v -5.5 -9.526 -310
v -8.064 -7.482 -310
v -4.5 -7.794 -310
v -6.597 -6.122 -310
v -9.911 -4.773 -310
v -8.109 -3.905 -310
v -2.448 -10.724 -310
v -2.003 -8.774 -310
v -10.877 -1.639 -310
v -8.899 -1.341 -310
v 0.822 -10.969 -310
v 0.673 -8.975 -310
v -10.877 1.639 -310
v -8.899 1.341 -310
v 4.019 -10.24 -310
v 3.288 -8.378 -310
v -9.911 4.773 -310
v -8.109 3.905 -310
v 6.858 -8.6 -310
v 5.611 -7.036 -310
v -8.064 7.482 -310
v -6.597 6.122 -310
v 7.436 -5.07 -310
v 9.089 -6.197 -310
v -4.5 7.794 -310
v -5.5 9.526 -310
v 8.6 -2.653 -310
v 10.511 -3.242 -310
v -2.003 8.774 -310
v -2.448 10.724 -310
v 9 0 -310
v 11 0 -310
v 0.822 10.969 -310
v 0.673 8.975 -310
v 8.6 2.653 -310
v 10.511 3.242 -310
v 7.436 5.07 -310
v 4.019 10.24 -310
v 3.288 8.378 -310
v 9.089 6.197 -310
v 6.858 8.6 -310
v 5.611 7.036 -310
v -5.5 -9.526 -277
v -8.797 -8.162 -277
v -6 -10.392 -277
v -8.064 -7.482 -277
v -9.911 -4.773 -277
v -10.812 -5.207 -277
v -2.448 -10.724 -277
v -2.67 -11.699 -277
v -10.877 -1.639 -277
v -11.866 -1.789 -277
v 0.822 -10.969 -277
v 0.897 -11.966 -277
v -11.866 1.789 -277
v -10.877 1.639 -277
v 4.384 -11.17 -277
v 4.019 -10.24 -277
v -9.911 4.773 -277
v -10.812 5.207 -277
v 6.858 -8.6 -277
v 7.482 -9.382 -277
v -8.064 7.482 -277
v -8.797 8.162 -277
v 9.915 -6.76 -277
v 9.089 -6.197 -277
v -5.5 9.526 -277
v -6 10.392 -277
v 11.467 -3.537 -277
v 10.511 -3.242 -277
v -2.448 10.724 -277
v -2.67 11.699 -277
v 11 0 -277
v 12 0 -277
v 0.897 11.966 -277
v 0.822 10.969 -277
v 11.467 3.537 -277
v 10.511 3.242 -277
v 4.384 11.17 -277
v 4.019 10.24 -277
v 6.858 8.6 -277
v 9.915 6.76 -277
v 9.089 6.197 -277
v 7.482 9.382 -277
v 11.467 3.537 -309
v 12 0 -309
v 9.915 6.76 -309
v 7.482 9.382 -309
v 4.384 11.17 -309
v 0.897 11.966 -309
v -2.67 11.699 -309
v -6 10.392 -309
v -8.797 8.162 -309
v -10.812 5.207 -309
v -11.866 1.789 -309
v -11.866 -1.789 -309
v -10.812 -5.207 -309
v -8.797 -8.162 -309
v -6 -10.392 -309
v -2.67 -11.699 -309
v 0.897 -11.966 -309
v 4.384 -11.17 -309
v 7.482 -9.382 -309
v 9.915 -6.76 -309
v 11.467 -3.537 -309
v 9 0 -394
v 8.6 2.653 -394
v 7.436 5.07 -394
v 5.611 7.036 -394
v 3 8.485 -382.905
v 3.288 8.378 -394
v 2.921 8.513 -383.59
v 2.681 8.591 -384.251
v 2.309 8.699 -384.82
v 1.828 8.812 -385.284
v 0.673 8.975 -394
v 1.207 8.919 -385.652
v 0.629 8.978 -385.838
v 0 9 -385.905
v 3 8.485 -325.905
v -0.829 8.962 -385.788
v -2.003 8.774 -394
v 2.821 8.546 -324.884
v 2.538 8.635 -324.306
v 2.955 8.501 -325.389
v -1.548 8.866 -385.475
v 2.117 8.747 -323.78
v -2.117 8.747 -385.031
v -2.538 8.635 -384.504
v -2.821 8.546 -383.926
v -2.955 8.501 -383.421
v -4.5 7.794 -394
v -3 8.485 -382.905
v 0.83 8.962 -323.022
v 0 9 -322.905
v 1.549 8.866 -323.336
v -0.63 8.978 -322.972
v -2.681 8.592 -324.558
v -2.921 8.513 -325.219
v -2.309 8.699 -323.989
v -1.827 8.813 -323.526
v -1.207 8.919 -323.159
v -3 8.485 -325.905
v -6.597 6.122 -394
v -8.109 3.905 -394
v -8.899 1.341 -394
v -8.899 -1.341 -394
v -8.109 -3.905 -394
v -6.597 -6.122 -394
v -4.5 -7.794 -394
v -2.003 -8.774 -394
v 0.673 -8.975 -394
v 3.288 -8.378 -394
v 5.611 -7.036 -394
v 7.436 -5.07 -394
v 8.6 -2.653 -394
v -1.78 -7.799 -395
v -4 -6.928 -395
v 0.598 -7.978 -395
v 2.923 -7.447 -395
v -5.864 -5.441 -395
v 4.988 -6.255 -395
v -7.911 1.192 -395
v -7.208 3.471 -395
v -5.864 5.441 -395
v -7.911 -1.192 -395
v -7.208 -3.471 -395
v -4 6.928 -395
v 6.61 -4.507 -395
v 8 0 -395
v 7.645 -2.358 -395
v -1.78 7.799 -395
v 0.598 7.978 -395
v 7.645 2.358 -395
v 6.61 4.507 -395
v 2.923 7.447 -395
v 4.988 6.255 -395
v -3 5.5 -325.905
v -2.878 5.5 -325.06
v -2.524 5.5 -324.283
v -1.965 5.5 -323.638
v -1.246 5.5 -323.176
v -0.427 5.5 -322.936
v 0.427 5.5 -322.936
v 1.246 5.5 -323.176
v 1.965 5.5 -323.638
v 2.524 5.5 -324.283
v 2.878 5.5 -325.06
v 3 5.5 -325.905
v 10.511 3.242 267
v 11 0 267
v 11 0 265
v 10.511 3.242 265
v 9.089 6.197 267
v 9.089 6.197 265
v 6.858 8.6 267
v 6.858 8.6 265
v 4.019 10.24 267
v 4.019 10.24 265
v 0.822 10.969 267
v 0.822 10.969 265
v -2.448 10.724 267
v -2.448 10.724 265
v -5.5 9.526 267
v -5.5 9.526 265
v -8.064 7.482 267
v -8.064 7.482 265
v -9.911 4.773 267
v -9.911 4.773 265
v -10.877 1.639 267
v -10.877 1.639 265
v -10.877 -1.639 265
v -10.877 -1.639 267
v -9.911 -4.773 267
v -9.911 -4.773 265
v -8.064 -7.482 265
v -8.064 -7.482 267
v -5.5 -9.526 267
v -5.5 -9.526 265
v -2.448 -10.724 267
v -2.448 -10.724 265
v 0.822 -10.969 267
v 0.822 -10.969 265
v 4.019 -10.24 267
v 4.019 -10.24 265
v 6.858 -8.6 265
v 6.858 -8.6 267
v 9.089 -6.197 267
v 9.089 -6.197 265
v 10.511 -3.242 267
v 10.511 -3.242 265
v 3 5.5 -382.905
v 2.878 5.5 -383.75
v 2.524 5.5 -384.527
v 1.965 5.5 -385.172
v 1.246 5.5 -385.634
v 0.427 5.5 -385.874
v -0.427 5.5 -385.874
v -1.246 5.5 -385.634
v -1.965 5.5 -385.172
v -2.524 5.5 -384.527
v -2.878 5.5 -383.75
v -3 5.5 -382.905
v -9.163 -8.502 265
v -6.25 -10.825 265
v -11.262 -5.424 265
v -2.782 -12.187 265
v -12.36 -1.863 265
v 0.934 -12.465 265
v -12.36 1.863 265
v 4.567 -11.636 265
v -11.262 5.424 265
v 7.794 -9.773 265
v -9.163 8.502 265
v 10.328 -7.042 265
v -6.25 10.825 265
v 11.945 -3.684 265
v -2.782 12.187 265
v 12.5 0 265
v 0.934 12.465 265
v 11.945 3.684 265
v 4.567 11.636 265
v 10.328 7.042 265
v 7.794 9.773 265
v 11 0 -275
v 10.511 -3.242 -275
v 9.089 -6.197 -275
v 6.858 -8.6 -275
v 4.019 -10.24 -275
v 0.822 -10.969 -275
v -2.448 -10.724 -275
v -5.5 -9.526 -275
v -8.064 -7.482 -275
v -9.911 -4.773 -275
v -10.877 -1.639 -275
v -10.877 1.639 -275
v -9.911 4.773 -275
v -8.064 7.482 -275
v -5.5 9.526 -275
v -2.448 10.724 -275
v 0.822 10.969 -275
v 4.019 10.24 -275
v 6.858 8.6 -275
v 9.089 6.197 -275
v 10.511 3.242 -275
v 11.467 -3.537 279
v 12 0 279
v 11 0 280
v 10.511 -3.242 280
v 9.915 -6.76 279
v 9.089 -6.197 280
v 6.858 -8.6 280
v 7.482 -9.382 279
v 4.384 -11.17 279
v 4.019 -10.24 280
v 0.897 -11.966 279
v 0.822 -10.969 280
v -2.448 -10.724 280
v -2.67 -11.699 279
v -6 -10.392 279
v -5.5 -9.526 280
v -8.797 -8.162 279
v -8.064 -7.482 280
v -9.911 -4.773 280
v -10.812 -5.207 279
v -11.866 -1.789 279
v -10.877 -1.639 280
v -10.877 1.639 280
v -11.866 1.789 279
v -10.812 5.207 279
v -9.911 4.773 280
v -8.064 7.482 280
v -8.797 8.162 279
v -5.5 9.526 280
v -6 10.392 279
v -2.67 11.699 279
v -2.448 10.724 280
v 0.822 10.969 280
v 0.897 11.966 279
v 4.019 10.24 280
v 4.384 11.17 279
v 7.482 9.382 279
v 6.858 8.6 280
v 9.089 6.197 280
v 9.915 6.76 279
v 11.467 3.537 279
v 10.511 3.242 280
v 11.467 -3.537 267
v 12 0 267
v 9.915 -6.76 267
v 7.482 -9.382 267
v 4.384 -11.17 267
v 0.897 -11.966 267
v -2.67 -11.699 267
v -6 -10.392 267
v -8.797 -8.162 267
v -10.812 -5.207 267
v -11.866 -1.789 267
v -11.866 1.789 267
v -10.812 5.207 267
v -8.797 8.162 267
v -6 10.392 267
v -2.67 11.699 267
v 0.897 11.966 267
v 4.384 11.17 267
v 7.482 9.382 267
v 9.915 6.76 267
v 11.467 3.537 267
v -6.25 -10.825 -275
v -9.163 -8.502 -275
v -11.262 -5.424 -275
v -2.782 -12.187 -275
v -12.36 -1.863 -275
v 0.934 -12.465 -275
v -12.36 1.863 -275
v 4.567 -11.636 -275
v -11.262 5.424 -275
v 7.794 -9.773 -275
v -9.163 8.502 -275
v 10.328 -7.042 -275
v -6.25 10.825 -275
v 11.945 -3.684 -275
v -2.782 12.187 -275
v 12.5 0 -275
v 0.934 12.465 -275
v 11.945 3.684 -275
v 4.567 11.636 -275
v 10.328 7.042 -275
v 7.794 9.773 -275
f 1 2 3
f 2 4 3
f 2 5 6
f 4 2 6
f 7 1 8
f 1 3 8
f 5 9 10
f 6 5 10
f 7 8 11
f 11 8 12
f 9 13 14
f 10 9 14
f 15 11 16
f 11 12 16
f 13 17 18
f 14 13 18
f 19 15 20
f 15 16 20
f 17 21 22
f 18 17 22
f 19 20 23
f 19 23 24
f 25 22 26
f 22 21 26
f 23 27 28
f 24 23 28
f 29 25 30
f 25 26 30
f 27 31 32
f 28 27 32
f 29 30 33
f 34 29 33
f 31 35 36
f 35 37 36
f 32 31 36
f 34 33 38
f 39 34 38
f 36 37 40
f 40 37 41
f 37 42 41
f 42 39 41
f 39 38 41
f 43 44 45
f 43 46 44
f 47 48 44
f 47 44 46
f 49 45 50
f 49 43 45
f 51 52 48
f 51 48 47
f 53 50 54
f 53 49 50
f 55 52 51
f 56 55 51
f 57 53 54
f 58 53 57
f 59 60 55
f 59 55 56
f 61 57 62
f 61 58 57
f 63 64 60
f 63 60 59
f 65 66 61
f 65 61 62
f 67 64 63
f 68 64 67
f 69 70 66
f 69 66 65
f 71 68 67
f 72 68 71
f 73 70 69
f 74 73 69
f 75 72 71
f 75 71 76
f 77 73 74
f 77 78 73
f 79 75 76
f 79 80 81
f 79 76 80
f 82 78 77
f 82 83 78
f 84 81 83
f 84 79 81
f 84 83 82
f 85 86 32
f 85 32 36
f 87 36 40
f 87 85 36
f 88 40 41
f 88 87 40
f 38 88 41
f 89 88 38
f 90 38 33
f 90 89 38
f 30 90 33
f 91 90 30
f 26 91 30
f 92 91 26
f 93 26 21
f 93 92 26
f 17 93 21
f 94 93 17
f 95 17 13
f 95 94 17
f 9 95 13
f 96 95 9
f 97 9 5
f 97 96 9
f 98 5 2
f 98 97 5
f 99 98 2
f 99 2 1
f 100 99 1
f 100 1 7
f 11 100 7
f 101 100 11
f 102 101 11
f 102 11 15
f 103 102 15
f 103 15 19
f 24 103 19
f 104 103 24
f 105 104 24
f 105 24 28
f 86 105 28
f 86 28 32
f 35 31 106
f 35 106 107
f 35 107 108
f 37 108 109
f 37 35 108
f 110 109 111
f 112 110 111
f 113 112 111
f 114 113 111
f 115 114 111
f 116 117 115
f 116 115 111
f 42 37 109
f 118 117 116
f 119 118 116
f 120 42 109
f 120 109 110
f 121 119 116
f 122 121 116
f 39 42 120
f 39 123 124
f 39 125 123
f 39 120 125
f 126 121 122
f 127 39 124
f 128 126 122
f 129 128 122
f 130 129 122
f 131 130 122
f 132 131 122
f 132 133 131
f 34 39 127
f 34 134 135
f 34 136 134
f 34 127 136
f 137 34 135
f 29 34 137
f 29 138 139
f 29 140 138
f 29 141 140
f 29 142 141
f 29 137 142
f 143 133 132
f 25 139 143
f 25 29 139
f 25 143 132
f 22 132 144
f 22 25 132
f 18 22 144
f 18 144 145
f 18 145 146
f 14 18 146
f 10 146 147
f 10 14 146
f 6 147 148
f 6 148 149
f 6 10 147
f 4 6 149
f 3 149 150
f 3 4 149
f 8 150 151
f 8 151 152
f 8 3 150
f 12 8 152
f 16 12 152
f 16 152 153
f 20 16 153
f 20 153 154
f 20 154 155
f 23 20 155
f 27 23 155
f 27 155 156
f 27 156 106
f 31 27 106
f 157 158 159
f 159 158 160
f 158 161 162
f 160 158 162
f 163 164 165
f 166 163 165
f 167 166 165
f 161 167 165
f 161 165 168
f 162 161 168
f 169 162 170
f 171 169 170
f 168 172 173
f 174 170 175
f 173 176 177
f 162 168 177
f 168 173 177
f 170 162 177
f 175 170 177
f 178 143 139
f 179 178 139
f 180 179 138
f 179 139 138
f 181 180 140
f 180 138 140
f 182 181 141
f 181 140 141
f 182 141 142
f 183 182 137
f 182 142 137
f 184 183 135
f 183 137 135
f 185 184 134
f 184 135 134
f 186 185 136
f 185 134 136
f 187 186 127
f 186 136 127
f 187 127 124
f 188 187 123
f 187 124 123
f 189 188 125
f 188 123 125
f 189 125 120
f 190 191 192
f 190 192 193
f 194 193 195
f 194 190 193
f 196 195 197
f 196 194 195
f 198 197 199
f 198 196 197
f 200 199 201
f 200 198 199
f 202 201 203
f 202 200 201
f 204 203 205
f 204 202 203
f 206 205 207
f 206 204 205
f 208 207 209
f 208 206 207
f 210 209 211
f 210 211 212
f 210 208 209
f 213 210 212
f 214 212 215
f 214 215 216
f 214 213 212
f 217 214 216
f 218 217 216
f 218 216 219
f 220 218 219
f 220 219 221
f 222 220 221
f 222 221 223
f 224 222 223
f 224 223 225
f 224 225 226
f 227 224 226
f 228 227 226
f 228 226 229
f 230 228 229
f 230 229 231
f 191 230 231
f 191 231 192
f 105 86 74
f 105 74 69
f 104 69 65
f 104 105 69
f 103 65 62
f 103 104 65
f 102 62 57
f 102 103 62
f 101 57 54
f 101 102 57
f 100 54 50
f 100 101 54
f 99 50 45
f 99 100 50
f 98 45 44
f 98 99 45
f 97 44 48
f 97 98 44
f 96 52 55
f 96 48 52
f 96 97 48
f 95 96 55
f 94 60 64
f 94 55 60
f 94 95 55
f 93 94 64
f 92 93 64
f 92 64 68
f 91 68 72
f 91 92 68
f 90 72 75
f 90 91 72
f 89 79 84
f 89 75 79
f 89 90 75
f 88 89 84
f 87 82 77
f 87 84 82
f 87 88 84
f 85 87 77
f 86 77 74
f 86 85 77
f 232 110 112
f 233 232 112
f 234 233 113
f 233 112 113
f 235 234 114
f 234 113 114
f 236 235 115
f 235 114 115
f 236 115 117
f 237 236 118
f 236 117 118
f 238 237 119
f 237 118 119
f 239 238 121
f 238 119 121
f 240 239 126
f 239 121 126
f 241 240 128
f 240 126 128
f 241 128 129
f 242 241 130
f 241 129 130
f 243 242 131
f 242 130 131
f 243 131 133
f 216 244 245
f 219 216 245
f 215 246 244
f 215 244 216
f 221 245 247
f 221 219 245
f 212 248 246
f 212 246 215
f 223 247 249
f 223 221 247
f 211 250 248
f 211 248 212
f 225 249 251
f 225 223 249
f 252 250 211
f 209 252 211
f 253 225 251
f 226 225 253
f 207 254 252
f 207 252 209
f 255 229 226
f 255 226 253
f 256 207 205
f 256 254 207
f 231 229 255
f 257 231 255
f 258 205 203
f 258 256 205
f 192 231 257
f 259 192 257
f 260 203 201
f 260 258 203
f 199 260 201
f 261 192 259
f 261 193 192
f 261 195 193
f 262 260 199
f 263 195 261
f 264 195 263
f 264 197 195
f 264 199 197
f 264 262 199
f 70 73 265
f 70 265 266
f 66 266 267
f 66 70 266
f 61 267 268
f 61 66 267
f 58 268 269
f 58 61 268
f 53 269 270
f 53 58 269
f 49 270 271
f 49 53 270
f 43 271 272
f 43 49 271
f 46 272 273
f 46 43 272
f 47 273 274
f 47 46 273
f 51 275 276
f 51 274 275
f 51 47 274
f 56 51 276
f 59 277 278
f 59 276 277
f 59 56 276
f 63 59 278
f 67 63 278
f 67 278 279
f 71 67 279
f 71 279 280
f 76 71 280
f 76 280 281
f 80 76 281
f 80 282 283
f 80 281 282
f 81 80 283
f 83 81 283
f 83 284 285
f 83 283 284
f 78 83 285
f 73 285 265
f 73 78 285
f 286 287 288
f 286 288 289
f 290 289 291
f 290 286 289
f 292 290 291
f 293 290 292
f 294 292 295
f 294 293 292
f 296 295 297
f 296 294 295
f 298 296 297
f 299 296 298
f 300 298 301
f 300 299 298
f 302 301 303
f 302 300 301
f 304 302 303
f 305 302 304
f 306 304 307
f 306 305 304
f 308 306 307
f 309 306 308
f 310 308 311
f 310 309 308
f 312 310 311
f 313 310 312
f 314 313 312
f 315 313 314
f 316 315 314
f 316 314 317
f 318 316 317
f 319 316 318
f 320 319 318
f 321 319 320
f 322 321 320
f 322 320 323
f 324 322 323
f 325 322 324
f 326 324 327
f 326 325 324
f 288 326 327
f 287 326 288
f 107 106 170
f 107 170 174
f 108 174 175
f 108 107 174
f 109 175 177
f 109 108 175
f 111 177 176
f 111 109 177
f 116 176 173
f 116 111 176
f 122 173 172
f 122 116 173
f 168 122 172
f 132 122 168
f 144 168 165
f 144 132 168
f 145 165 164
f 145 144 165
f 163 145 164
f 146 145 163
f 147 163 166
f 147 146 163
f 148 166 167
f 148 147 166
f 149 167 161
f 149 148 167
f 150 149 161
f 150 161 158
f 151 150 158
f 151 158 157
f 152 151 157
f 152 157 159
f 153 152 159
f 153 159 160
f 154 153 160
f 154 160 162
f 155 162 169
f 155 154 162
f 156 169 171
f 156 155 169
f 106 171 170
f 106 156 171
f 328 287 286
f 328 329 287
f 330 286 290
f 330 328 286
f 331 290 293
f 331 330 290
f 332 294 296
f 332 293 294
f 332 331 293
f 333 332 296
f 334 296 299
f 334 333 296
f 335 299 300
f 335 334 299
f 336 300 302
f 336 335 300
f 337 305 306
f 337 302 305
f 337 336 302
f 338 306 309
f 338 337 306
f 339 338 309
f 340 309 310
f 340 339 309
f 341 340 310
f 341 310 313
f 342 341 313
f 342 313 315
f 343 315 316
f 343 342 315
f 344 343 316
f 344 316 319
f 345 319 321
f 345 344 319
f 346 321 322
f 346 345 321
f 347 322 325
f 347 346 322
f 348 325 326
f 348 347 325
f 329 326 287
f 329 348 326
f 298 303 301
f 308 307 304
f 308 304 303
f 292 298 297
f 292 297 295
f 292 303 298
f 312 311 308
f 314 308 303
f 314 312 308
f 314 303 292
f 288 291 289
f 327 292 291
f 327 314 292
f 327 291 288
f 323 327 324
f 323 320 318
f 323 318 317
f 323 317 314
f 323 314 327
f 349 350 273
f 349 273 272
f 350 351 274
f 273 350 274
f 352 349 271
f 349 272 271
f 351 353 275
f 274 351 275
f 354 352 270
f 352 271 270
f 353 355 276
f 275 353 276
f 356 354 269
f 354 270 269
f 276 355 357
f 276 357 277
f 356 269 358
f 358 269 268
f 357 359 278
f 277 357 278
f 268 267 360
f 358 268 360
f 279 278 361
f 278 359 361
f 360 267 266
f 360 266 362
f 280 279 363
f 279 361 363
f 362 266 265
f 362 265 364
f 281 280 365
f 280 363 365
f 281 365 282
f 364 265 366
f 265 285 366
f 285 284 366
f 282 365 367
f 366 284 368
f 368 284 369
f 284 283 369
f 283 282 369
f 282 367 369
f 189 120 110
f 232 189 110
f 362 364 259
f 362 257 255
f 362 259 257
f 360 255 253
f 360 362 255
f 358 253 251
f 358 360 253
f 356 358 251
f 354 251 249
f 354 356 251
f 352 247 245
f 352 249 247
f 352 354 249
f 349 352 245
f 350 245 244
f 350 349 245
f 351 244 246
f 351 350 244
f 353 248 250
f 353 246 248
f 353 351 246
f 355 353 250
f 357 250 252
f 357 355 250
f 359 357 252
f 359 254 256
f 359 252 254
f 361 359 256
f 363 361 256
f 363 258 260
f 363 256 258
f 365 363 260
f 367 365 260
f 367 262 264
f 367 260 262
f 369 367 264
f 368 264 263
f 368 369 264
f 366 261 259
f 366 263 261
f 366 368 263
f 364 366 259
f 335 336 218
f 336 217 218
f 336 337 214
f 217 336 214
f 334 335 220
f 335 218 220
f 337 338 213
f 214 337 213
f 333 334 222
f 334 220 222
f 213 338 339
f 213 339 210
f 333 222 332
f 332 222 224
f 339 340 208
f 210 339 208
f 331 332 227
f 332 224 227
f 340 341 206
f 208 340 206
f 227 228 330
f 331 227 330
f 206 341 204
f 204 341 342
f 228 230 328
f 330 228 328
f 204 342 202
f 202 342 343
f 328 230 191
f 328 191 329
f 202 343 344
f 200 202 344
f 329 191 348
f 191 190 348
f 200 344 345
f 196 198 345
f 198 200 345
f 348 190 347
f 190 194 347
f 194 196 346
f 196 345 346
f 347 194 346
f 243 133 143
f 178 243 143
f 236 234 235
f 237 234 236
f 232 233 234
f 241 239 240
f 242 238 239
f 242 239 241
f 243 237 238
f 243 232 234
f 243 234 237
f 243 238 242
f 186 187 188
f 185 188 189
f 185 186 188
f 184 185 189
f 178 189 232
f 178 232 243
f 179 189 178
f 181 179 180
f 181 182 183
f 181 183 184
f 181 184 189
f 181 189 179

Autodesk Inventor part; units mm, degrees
ref_plane "YZ Plane" through (0, 0, 0) normal (1, 0, 0) x (0, 1, 0)
ref_plane "XY Plane" through (0, 0, 0) normal (0, 0, 1) x (1, 0, 0)
sketch "Sketch1" plane through (0, 0, 0) normal (0, 1, 0) x (-1, 0, 0)
  line L0 (0, 0) -> (0, 280)
  line L1 (0, 280) -> (-12.5, 280)
  line L2 (-12.5, 280) -> (-12.5, 0)
  line L3 (-12.5, 0) -> (-12.5, -395)
  line L4 (-12.5, -395) -> (0, -395)
  line L5 (0, -395) -> (0, 0)
  line L6 (-9, -395) -> (-9, -310)
  line L7 (-9, -310) -> (-12.5, -310)
  line L8 (-12.5, -275) -> (-12, -275)
  line L9 (-12, -275) -> (-12, -310)
  line L10 (-12, 280) -> (-12, 265)
  line L11 (-12, 265) -> (-12.5, 265)
  line L12 (-12, 265) -> (-11, 265)
  line L13 (-11, 265) -> (-11, 267)
  line L14 (-11, 267) -> (-12, 267)
  line L15 (-12, -275) -> (-11, -275)
  line L16 (-11, -275) -> (-11, -277)
  line L17 (-11, -277) -> (-12, -277)
  dimension "d0" = 25
  dimension "d1" = 280
  dimension "d2" = 395
  dimension "d4" = 85
  dimension "d5" = 18
  dimension "d6" = 24
  dimension "d7" = 35
  dimension "d8" = 15
  dimension "d18" = 22
  dimension "d19" = 2
revolve "Revolution1" add sketch "Sketch1" angle 360 about axis through (0, 0, 0) along (0, 0, 1) contours L5 L4 L6 L7 L9 L17 L16 L15 L8 L3 L2 L11 L12 L13 L14 L10 L1 L0
ref_plane "Work Plane1" through (0, 9, -352.5) normal (0, 1, 0) x (-1, 0, 0)
sketch "Sketch2" plane through (0, 9, -352.5) normal (0, 1, 0) x (-1, 0, 0)
  line L0 (9, -42.5) -> (-9, -42.5) projected
  line L1 (9, 42.5) -> (-9, 42.5) projected
  line L2 (9, -42.5) -> (9, 42.5) projected
  line L3 (-9, -42.5) -> (-9, 42.5) projected
  line L4 (9, -40.905) -> (-9, -40.905) construction
  line L5 (9, 37.095) -> (-9, 37.095) construction
  line L6 (0, 29.595) -> (0, -33.405) construction
  line L7 (-3, 26.595) -> (-3, -30.405)
  line L8 (3, -30.405) -> (3, 26.595)
  arc A0 (3, 26.595) -> (-3, 26.595) centre (0, 26.595) ccw
  arc A1 (-3, -30.405) -> (3, -30.405) centre (0, -30.405) ccw
  line L9 (0, 37.095) -> (0, -40.905) construction
  point P0 (0, 352.5)
  point P1 (0, -1.905)
  point P2 (0, -1.905)
  dimension "d9" = 1.595
  dimension "d10" = 78
  dimension "d11" = 63
  dimension "d12" = 6
extrude "Extrusion1" cut sketch "Sketch2" against normal blind 3.5 contours A0 L8 A1 L7
chamfer "Chamfer1" distance 1 angle 45 3 edges at (-9, 0, -395) (-12, 0, 280) (-12, 0, -310)
properties part number "TRM 028 main shaft"
